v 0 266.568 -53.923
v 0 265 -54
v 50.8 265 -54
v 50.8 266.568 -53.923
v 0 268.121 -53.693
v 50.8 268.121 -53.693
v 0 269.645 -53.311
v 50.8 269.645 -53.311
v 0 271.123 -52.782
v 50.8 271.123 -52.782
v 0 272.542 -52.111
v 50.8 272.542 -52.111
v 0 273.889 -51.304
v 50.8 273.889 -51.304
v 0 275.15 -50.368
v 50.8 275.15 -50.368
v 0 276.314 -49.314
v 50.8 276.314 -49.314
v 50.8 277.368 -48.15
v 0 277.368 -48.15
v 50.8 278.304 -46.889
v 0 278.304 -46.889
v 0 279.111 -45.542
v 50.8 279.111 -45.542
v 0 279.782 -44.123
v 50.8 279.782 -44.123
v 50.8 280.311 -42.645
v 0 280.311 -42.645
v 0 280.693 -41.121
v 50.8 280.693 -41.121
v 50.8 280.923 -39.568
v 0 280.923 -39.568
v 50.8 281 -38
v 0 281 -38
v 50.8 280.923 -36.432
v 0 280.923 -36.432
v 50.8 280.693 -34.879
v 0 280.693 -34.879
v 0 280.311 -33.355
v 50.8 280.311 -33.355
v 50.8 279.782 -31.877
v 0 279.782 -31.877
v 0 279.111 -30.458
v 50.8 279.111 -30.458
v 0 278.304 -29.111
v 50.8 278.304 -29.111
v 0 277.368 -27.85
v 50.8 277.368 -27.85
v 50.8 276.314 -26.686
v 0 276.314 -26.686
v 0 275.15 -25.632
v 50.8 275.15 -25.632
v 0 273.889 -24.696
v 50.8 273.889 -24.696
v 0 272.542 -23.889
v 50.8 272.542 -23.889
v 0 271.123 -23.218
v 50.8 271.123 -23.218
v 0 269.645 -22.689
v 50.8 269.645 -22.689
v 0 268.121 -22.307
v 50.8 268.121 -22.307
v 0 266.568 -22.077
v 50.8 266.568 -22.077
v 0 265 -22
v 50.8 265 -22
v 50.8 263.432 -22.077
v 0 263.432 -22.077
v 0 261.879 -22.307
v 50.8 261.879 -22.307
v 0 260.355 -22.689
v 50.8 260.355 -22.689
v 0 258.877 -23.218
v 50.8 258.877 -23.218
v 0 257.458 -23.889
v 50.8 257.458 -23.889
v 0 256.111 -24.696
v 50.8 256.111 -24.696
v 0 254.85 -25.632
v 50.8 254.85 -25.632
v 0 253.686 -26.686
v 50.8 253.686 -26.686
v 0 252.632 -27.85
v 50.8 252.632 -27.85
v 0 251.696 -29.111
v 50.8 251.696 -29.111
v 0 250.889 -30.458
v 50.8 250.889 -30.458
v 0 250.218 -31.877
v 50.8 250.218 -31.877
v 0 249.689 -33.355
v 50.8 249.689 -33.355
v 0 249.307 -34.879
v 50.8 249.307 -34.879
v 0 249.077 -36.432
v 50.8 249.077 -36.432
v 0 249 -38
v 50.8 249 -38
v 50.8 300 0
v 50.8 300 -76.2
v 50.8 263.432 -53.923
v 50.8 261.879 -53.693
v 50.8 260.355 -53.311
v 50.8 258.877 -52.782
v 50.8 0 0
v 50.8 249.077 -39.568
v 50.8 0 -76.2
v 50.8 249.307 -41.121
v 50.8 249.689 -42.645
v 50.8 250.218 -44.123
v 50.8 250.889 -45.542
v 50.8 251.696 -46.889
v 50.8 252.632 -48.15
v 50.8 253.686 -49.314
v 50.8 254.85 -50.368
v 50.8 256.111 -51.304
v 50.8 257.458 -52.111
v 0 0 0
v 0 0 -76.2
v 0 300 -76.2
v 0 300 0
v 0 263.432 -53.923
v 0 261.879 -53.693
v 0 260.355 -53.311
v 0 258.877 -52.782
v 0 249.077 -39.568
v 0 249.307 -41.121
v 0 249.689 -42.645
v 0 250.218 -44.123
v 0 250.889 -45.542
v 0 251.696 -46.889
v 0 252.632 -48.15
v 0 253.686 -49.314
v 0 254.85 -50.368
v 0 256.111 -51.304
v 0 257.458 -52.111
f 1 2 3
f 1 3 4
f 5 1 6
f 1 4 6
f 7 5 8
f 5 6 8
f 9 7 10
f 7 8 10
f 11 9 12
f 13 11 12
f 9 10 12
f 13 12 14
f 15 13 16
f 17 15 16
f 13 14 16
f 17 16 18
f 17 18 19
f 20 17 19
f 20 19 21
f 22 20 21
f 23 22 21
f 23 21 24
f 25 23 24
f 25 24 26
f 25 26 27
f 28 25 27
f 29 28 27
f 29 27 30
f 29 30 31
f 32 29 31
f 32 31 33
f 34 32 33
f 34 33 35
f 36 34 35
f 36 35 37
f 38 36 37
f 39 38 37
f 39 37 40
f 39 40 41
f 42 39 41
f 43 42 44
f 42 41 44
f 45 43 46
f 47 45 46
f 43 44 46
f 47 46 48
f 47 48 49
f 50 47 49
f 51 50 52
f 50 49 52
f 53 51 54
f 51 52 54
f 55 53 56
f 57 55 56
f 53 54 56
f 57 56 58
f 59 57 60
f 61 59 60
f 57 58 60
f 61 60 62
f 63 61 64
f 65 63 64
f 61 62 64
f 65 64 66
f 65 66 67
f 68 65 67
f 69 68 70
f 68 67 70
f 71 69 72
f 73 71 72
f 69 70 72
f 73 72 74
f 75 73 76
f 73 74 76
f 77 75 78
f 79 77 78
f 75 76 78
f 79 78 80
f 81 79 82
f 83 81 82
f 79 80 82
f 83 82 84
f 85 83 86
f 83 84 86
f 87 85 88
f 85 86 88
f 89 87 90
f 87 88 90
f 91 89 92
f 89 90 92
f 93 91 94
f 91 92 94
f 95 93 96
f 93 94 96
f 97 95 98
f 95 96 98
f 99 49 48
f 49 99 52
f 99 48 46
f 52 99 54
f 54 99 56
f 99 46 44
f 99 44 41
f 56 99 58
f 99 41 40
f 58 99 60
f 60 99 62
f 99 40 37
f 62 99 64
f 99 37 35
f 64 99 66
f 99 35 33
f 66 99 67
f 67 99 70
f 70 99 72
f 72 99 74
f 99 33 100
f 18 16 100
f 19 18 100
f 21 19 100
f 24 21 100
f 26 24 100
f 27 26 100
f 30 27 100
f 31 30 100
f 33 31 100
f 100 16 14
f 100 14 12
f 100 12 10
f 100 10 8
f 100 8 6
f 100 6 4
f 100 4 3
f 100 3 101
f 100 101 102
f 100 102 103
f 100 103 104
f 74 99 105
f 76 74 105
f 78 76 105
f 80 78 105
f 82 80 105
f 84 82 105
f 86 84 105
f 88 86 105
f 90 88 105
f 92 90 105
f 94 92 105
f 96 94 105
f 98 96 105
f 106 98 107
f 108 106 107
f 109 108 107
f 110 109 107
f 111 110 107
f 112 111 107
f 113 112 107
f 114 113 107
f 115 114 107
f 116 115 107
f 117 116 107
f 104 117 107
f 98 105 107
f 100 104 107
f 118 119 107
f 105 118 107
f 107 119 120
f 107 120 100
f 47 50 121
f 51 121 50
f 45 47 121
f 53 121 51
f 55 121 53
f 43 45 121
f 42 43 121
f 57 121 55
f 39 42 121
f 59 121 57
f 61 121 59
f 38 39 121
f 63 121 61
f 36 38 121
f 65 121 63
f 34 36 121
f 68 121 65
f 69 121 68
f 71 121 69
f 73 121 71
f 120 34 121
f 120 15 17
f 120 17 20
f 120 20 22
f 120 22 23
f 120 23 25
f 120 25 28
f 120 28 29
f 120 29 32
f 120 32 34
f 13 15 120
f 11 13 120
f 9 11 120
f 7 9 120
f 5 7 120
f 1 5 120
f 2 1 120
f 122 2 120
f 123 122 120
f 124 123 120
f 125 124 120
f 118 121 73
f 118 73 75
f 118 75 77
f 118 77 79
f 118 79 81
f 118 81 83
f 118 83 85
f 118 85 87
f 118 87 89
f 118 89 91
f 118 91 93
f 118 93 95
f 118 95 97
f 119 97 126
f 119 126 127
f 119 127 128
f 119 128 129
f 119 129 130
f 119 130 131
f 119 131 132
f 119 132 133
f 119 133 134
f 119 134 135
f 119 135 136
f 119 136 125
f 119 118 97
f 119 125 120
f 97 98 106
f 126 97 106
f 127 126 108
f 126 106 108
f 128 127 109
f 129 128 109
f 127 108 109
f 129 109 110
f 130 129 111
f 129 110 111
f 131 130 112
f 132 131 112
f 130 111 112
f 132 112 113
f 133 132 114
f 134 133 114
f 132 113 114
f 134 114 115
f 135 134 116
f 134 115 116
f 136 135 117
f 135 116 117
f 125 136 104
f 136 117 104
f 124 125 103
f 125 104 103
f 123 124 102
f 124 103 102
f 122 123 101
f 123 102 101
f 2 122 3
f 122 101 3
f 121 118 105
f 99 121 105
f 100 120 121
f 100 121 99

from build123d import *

# Parameters (mm, degrees)
SKETCH1_W           = 50.8
SKETCH1_H           = 76.2
BOSS_EXTRUDE1_DEPTH = 300
CUT_EXTRUDE1_DEPTH  = 150


with BuildPart() as part:
    # Sketch1 → Boss-Extrude1 (new body)
    with BuildSketch(Plane(origin=(0, 0, 0), x_dir=(1, 0, 0), z_dir=(0, 1, 0))):
        with Locations((25.4, 38.1)):
            Rectangle(SKETCH1_W, SKETCH1_H)
    extrude(amount=BOSS_EXTRUDE1_DEPTH)

    # Sketch2 → Cut-Extrude1 (cut)
    with BuildSketch(Plane(origin=(50.8, 0, 0), x_dir=(0, 0, -1), z_dir=(1, 0, 0))):
        with BuildLine():
            ThreePointArc((22, 265), (26.686291501, 253.686291501), (38, 249))
            Line((38, 249), (38, 265))
            Line((38, 265), (22, 265))
        make_face()
        with BuildLine():
            Line((38, 265), (38, 249))
            ThreePointArc((38, 249), (49.313708499, 253.686291501), (54, 265))
            ThreePointArc((54, 265), (38, 281), (22, 265))
            Line((22, 265), (38, 265))
        make_face()
    extrude(amount=-CUT_EXTRUDE1_DEPTH, mode=Mode.SUBTRACT)


solid = part.part
